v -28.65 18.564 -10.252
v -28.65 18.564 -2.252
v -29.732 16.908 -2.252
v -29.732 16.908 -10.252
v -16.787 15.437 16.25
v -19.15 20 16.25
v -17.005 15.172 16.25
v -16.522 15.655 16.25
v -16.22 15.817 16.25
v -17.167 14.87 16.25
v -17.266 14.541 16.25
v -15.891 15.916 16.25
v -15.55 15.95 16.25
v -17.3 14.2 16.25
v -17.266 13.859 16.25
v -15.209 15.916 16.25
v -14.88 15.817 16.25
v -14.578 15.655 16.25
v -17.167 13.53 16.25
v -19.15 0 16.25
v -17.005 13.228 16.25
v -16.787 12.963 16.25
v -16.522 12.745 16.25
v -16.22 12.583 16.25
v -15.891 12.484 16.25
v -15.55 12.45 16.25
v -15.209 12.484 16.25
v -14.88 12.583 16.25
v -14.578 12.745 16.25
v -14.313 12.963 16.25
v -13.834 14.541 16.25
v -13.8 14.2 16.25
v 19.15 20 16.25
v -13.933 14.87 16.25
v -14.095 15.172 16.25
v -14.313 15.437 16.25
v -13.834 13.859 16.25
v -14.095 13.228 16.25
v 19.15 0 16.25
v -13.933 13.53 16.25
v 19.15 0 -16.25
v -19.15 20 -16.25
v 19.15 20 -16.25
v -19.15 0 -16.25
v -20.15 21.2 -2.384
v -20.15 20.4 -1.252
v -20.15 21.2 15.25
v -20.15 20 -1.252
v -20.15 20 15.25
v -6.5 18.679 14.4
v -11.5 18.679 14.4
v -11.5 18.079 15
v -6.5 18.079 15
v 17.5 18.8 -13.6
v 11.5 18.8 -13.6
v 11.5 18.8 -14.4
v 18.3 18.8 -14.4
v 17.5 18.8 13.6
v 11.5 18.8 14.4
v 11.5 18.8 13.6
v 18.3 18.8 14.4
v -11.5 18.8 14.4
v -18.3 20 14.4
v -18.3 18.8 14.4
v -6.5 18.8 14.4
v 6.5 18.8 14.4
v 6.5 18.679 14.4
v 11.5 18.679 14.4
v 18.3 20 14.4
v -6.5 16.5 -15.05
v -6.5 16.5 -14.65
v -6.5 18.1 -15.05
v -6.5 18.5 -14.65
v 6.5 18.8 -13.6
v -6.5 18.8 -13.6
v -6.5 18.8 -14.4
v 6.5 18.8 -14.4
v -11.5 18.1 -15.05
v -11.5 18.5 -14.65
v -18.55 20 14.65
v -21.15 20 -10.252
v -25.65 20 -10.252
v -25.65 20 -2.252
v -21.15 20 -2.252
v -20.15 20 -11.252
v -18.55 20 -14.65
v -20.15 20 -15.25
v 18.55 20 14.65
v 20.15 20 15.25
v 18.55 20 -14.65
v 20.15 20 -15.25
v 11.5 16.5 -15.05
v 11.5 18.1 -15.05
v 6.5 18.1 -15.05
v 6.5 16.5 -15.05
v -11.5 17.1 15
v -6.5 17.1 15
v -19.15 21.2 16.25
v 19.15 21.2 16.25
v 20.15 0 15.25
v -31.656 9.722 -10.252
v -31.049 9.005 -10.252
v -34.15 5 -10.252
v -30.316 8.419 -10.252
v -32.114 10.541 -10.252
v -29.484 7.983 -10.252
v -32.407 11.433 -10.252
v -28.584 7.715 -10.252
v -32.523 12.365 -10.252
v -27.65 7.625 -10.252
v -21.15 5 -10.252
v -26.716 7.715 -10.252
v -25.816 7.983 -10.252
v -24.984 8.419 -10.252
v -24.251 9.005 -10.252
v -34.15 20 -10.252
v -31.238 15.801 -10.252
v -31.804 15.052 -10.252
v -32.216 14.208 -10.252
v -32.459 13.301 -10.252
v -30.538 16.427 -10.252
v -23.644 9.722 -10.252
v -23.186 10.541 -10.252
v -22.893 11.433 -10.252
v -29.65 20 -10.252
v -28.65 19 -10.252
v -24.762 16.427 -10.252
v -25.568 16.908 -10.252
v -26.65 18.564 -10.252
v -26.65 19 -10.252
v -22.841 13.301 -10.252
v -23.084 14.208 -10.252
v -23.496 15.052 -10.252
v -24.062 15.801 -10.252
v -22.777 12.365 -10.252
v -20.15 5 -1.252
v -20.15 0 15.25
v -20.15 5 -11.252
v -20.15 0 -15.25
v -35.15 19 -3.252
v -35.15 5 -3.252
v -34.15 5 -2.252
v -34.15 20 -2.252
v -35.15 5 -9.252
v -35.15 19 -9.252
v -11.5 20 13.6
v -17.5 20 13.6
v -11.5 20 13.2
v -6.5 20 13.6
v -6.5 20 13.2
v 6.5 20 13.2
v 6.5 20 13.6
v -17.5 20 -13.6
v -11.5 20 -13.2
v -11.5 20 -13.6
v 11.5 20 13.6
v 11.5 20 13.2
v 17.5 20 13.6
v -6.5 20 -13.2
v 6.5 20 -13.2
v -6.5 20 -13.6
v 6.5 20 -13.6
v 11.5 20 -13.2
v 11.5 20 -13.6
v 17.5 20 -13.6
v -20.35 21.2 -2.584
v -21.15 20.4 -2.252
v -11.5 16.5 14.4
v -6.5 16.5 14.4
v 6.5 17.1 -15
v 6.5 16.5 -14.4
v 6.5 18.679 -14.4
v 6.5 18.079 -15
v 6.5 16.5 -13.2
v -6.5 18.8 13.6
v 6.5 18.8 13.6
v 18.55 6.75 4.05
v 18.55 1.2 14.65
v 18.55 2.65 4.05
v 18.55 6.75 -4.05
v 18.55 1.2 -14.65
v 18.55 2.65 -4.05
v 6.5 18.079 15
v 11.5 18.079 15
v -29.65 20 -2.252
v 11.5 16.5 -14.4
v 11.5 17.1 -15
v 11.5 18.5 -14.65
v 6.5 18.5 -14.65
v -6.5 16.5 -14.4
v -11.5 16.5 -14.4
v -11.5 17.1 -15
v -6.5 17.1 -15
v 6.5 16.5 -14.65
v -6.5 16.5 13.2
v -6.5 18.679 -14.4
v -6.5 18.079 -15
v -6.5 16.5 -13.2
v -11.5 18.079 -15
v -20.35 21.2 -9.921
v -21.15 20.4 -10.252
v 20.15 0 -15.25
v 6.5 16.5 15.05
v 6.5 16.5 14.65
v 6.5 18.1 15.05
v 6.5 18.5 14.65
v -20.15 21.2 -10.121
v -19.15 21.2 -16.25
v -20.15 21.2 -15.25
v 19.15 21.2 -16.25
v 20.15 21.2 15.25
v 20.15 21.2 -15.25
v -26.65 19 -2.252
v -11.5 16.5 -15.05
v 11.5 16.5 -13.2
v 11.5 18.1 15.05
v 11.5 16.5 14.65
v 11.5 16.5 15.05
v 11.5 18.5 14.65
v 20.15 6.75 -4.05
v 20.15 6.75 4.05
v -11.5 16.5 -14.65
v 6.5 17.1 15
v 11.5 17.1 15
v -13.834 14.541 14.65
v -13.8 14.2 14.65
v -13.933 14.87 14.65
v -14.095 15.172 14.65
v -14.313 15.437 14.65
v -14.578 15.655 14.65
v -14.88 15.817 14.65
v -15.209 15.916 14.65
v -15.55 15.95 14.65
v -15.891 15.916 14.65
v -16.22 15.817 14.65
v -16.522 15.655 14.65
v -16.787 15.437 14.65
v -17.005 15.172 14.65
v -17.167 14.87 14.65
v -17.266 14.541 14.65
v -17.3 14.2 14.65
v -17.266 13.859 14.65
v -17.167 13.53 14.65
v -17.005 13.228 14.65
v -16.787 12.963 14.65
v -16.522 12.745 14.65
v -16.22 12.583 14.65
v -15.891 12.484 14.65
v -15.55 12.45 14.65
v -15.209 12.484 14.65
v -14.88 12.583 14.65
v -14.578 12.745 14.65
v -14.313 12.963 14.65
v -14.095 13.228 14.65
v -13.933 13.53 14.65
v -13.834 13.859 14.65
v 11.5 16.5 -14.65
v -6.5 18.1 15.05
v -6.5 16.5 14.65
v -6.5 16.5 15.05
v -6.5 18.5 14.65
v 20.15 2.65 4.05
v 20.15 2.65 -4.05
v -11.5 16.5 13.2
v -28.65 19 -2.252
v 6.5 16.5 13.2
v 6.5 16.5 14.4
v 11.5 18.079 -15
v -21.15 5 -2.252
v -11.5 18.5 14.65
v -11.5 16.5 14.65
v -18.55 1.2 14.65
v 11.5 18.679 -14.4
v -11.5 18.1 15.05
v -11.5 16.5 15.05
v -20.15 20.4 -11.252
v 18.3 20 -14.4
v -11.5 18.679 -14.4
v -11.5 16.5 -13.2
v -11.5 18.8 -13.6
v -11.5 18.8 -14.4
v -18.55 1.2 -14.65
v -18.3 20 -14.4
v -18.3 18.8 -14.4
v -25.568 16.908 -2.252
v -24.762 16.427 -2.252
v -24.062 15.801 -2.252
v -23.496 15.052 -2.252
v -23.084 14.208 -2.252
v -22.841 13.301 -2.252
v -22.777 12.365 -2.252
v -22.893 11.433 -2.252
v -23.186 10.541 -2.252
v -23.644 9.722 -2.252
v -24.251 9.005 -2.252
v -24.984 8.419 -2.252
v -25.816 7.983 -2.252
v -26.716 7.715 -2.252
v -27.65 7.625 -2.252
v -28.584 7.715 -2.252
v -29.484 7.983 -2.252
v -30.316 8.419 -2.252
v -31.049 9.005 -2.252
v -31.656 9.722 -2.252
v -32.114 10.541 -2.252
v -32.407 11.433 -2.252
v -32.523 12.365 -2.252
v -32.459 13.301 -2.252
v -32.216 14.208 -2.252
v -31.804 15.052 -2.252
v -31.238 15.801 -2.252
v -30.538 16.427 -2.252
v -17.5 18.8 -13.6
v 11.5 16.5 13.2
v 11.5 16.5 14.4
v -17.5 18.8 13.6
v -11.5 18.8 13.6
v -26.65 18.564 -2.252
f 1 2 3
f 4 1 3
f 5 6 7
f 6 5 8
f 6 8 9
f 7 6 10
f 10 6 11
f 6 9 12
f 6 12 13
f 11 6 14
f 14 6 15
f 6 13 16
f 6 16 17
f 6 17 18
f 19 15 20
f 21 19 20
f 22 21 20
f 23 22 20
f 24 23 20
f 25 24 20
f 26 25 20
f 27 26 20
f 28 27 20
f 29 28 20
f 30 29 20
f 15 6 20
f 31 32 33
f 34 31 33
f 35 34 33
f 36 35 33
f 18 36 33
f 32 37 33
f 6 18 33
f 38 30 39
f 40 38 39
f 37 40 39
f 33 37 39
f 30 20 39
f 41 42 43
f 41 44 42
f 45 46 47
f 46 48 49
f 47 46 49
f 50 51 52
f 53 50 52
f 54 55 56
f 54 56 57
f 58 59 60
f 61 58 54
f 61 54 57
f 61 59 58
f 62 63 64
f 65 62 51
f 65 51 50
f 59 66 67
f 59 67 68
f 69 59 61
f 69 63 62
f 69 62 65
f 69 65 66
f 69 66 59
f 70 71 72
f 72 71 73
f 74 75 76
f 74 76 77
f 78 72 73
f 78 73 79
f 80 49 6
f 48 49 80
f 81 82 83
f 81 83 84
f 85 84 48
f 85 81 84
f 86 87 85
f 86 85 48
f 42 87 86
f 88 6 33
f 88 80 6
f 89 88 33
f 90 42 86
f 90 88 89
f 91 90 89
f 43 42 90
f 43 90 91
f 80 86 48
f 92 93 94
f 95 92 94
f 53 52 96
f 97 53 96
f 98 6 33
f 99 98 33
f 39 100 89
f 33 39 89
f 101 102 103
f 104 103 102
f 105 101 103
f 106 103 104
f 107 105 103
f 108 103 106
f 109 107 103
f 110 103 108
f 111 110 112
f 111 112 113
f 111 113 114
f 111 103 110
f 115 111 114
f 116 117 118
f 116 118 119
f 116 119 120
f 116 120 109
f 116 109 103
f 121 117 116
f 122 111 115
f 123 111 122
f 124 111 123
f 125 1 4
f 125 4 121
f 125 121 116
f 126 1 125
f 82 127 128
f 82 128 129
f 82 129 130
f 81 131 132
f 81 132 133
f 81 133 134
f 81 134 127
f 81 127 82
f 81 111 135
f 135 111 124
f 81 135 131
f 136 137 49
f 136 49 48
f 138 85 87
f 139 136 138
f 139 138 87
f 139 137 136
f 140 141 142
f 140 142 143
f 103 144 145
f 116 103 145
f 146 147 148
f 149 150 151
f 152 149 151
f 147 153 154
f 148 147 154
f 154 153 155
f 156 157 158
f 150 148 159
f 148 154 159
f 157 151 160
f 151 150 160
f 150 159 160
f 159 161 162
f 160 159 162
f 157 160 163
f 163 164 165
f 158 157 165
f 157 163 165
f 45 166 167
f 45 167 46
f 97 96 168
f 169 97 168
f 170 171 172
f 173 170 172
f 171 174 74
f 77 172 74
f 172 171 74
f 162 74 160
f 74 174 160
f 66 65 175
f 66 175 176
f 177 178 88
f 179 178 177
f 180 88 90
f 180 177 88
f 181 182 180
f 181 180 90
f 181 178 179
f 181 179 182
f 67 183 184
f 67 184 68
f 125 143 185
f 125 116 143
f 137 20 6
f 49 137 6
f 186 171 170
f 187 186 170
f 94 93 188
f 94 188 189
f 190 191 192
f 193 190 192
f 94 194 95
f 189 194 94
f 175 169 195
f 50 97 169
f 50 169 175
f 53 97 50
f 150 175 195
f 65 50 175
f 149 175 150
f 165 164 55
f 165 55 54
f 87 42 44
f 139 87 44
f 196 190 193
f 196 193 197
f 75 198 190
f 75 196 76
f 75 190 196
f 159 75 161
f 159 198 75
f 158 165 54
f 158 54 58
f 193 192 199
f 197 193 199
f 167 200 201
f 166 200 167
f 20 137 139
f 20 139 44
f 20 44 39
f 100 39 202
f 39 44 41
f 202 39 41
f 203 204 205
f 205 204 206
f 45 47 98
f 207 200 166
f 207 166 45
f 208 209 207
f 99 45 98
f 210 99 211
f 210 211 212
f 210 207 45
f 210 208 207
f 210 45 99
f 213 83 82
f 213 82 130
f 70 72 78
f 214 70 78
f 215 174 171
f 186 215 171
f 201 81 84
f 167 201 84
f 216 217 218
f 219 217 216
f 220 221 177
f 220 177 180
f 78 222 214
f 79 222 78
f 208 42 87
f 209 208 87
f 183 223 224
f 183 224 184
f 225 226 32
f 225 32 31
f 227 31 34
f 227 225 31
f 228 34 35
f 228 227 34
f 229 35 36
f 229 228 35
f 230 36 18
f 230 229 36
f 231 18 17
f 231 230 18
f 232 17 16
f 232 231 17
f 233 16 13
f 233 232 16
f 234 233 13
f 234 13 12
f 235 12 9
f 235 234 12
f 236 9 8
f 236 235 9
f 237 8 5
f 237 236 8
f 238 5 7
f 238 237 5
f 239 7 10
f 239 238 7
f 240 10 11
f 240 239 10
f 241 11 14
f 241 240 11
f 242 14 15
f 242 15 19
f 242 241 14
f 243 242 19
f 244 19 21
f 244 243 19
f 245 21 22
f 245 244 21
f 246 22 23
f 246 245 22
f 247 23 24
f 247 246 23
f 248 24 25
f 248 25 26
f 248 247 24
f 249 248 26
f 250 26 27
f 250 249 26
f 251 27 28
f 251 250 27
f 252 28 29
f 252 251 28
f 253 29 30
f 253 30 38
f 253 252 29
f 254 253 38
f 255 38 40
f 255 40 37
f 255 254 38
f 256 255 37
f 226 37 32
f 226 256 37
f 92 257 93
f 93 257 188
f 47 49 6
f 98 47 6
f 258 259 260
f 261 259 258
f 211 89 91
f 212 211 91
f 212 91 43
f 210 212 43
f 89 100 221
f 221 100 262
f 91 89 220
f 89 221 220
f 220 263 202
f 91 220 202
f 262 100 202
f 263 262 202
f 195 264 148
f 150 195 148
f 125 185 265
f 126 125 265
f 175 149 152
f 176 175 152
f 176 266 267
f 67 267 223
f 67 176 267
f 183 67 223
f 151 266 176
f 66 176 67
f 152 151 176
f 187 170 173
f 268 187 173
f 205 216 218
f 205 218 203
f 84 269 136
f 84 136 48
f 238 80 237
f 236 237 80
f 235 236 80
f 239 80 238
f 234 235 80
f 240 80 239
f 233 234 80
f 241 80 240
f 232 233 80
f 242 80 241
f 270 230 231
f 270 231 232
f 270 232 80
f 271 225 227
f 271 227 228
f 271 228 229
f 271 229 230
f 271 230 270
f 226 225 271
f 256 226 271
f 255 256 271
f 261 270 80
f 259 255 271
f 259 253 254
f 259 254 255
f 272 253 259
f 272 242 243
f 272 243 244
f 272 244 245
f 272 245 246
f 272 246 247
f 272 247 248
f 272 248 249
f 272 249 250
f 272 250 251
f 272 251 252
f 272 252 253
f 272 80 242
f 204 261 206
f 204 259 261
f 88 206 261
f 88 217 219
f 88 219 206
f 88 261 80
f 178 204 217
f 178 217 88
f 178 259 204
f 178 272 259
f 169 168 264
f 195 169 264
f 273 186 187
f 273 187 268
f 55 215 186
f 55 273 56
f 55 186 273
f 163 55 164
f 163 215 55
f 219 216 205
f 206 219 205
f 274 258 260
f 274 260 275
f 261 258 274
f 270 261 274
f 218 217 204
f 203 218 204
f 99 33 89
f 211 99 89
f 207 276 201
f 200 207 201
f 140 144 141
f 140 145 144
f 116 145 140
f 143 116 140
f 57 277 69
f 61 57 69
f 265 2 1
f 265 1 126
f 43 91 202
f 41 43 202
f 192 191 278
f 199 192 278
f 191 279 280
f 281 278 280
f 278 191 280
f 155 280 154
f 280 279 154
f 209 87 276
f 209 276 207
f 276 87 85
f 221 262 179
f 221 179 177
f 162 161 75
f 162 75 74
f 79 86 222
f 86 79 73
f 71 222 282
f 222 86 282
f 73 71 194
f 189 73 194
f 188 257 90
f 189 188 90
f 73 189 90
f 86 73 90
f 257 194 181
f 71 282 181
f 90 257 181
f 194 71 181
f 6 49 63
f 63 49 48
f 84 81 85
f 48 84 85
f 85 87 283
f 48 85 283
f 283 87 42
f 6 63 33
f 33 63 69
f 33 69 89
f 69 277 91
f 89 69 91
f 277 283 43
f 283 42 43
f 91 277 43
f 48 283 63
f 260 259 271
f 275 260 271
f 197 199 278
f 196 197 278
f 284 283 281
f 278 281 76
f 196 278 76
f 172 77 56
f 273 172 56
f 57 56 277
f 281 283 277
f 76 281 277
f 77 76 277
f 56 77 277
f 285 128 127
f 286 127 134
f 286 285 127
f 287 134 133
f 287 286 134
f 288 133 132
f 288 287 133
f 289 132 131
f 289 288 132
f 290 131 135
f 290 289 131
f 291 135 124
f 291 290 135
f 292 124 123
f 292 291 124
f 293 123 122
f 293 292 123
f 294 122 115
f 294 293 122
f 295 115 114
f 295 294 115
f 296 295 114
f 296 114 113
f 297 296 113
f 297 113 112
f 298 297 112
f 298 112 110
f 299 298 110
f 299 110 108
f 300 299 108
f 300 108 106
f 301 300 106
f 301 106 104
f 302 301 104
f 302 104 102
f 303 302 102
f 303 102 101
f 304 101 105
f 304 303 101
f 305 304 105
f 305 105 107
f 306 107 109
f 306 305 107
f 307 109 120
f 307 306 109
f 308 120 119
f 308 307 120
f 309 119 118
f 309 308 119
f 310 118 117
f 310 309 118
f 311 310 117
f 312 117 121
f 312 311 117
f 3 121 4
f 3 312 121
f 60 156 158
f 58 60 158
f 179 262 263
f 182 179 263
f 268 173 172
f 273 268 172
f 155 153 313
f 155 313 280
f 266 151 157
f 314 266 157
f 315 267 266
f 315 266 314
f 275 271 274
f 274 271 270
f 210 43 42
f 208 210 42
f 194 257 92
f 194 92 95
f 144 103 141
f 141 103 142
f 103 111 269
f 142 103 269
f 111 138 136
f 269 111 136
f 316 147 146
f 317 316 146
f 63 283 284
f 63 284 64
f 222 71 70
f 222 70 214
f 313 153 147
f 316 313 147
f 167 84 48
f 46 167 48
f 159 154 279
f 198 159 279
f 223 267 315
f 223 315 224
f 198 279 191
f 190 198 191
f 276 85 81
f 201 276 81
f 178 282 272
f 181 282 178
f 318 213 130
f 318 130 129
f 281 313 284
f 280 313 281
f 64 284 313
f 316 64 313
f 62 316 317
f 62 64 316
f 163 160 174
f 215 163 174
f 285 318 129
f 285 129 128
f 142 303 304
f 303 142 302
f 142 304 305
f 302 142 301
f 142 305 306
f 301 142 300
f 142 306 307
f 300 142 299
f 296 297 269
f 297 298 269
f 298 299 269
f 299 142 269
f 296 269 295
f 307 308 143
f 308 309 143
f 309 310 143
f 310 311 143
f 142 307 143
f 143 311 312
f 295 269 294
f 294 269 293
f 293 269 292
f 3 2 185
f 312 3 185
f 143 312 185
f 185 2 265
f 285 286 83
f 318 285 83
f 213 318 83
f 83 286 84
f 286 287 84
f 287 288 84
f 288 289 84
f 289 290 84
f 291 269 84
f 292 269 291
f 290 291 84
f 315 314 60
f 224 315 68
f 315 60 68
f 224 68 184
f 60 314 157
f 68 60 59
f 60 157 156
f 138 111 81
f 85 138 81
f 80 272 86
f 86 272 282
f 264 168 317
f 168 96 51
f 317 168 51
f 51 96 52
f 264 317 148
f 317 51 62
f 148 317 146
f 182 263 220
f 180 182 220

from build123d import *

# Parameters (mm, degrees)
SKETCH2_W                = 40.3
SKETCH2_H                = 32.5
BOSS_EXTRUDE1_DEPTH      = 1.2
SKETCH2_3_W              = 40.3
SKETCH2_3_H              = 32.5
SKETCH2_3_W_2            = 37.1
SKETCH2_3_H_2            = 29.3
BOSS_EXTRUDE2_DEPTH      = 20
CUT_EXTRUDE1_REACH       = 49.835
SKETCH3_W                = 8.1
SKETCH3_H                = 4.1
CHAMFER1_SIZE            = 1
SKETCH4_W                = 8
SKETCH4_H                = 15
BOSS_EXTRUDE3_DEPTH      = 15
CUT_EXTRUDE3_REACH       = 46.473
CHAMFER2_SIZE            = 1.292646163
CHAMFER2_SIZE_2          = 1
CHAMFER3_SIZE            = 1
SKETCH6_W                = 5
SKETCH6_H                = 2
CUT_EXTRUDE4_DEPTH       = 0.4
CHAMFER4_SIZE            = 0.4
CHAMFER4_OF_MIRROR1_SIZE = 0.4
SKETCH7_W                = 37.1
SKETCH7_H                = 29.3
BOSS_EXTRUDE4_DEPTH      = 1.2
CHAMFER5_SIZE            = 0.8
SKETCH8_W                = 36.6
SKETCH8_H                = 28.8
SKETCH8_W_2              = 35
SKETCH8_H_2              = 27.2
BOSS_EXTRUDE5_DEPTH      = 1.2
SKETCH10_W               = 5
SKETCH10_H               = 1.2
BOSS_EXTRUDE6_DEPTH      = 3.5
BOSS_EXTRUDE7_DEPTH      = 5
CUT_EXTRUDE6_START       = -11.5
CUT_EXTRUDE6_DEPTH       = 5
CUT_EXTRUDE6_START_2     = 6.5
CUT_EXTRUDE6_2_DEPTH     = 5
CUT_EXTRUDE6_START_3     = 14.65
CUT_EXTRUDE6_3_OUTLINE_R = 1.75
CUT_EXTRUDE6_3_DEPTH     = 1.6


with BuildPart() as part:
    # Sketch2 → Boss-Extrude1 (new body)
    with BuildSketch(Plane(origin=(0, 0, 0), x_dir=(1, 0, 0), z_dir=(0, 1, 0))):
        Rectangle(SKETCH2_W, SKETCH2_H)
    extrude(amount=BOSS_EXTRUDE1_DEPTH)

    # Sketch2<3> → Boss-Extrude2 (add)
    with BuildSketch(Plane(origin=(0, 0, 0), x_dir=(1, 0, 0), z_dir=(0, 1, 0))):
        Rectangle(SKETCH2_3_W, SKETCH2_3_H)
        Rectangle(SKETCH2_3_W_2, SKETCH2_3_H_2, mode=Mode.SUBTRACT)
    extrude(amount=BOSS_EXTRUDE2_DEPTH)

    # Sketch3 → Cut-Extrude1 (cut, up to next)
    with BuildSketch(Plane(origin=(20.15, 0, 0), x_dir=(0, 0, -1), z_dir=(1, 0, 0)), mode=Mode.PRIVATE) as cut_extrude1_sk1:
        with Locations((0, 4.7)):
            Rectangle(SKETCH3_W, SKETCH3_H)
    cut_extrude1_tool1 = extrude(cut_extrude1_sk1.sketch, amount=-CUT_EXTRUDE1_REACH, mode=Mode.PRIVATE) & part.part
    add(cut_extrude1_tool1.solids().sort_by_distance((20.15, 4.7, 0))[0], mode=Mode.SUBTRACT)

    # Chamfer1
    chamfer1_edges = [part.edges().sort_by_distance(p)[0] for p in [
        (-20.15, 10, -16.25),
        (20.15, 10, -16.25),
        (20.15, 10, 16.25),
        (-20.15, 10, 16.25),
    ]]
    chamfer(chamfer1_edges, length=CHAMFER1_SIZE)

    # Sketch4 → Boss-Extrude3 (add)
    with BuildSketch(Plane.ZY.offset(20.15)):
        with Locations((-6.25220384, 12.5)):
            Rectangle(SKETCH4_W, SKETCH4_H)
    extrude(amount=BOSS_EXTRUDE3_DEPTH)

    # Sketch5 → Cut-Extrude3 (cut, up to next)
    with BuildSketch(Plane.XY.offset(-2.25220384), mode=Mode.PRIVATE) as cut_extrude3_sk1:
        with BuildLine():
            Line((-28.65, 17.271333671), (-28.65, 20))
            Line((-28.65, 20), (-26.65, 20))
            Line((-26.65, 20), (-26.65, 17.271333671))
            ThreePointArc((-26.65, 17.271333671), (-27.65, 7.625), (-28.65, 17.271333671))
        make_face()
    cut_extrude3_tool1 = extrude(cut_extrude3_sk1.sketch, amount=-CUT_EXTRUDE3_REACH, mode=Mode.PRIVATE) & part.part
    add(cut_extrude3_tool1.solids().sort_by_distance((-27.65, 12.91032, -2.252204))[0], mode=Mode.SUBTRACT)

    # Chamfer2
    # the kernel refuses this chamfer: 1.292646163, 1 mm, written as the material it takes off along each edge
    with BuildSketch(Plane(origin=(-28.65, 17.271333671, 1.088369735), x_dir=(0, 1, 0), z_dir=(0, 0, -1))) as chamfer2_piece_1:
        with BuildLine():
            Line((CHAMFER2_SIZE, 0), (-0.363341225, -1.082120936))
            ThreePointArc((-0.363341225, -1.082120936), (-0.156455935, -0.571155143), (0, 0))
            Line((0, 0), (CHAMFER2_SIZE, 0))
        make_face()
    extrude(amount=14.68114715, mode=Mode.SUBTRACT)
    with BuildSketch(Plane(origin=(-28.65, 20, 0.319479148), x_dir=(-1, 0, 0), z_dir=(0, 0, -1))) as chamfer2_piece_2:
        Polygon((CHAMFER2_SIZE_2, 0), (0, -CHAMFER2_SIZE_2), (0, 0), align=None)
    extrude(amount=13.143365976, mode=Mode.SUBTRACT)
    with BuildSketch(Plane(origin=(-26.65, 20, 0.319479148), x_dir=(1, 0, 0), z_dir=(0, 0, -1))) as chamfer2_piece_3:
        Polygon((CHAMFER2_SIZE_2, 0), (0, CHAMFER2_SIZE_2), (0, 0), align=None)
    extrude(amount=13.143365976, mode=Mode.SUBTRACT)
    with BuildSketch(Plane(origin=(-26.65, 17.271333671, 1.088369735), x_dir=(0, 1, 0), z_dir=(0, 0, -1))) as chamfer2_piece_4:
        with BuildLine():
            Line((CHAMFER2_SIZE, 0), (-0.363341225, 1.082120936))
            ThreePointArc((-0.363341225, 1.082120936), (-0.156455935, 0.571155143), (0, 0))
            Line((0, 0), (CHAMFER2_SIZE, 0))
        make_face()
    extrude(amount=14.68114715, mode=Mode.SUBTRACT)

    # Chamfer3
    chamfer3_edges = [part.edges().sort_by_distance(p)[0] for p in [
        (-20.15, 12.5, -10.25220384),
        (-20.15, 12.5, -2.25220384),
        (-35.15, 12.5, -10.25220384),
        (-35.15, 12.5, -2.25220384),
        (-35.15, 20, -6.25220384),
    ]]
    chamfer(chamfer3_edges, length=CHAMFER3_SIZE)

    # Sketch6 → Cut-Extrude4 (cut)
    with BuildSketch(Plane(origin=(0, 0, 14.65), x_dir=(-1, 0, 0), z_dir=(0, 0, -1))):
        with Locations((-9, 17.5)):
            Rectangle(SKETCH6_W, SKETCH6_H)
        with Locations((9, 17.5)):
            Rectangle(SKETCH6_W, SKETCH6_H)
    cut_extrude4 = extrude(amount=-CUT_EXTRUDE4_DEPTH, mode=Mode.SUBTRACT)

    # Chamfer4
    chamfer4_edges = [part.edges().sort_by_distance(p)[0] for p in [
        (9, 18.5, 15.05),
        (-9, 18.5, 15.05),
    ]]
    chamfer(chamfer4_edges, length=CHAMFER4_SIZE - 0.0001)  # a hair under: the kernel refuses the full size

    # Mirror1: Cut-Extrude4 across plane
    add(cut_extrude4.mirror(Plane.XY), mode=Mode.SUBTRACT)

    # Chamfer4 of Mirror1
    chamfer4_of_mirror1_edges = [part.edges().sort_by_distance(p)[0] for p in [
        (9, 18.5, -15.05),
        (-9, 18.5, -15.05),
    ]]
    chamfer(chamfer4_of_mirror1_edges, length=CHAMFER4_OF_MIRROR1_SIZE - 0.0001)  # a hair under: the kernel refuses the full size

    # Cut-Extrude6 3 outline → Cut-Extrude6 3 (cut)
    with BuildSketch(Plane.XY.offset(CUT_EXTRUDE6_START_3)):
        with Locations((-15.55, 14.2)):
            Circle(CUT_EXTRUDE6_3_OUTLINE_R)
    extrude(amount=CUT_EXTRUDE6_3_DEPTH, mode=Mode.SUBTRACT)


with BuildPart() as body_2:
    # Sketch7 → Boss-Extrude4 (new body)
    # profile 1 of 2: a face of its own
    with BuildSketch(Plane(origin=(0, 20, 0), x_dir=(1, 0, 0), z_dir=(0, 1, 0))):
        Polygon((-21.15, 10.25220384), (-21.15, 2.25220384), (-20.15, 1.25220384), (-20.15, -15.25), (-19.15, -16.25), (19.15, -16.25), (20.15, -15.25), (20.15, 15.25), (19.15, 16.25), (-19.15, 16.25), (-20.15, 15.25), (-20.15, 11.25220384), align=None)
        Rectangle(SKETCH7_W, SKETCH7_H, mode=Mode.SUBTRACT)
    # profile 2 of 2: a face of its own
    with BuildSketch(Plane(origin=(0, 20, 0), x_dir=(1, 0, 0), z_dir=(0, 1, 0))):
        Rectangle(SKETCH7_W, SKETCH7_H)
    extrude(amount=BOSS_EXTRUDE4_DEPTH)

    # Chamfer5
    chamfer5_edges = [body_2.edges().sort_by_distance(p)[0] for p in [
        (-21.15, 21.2, -6.25220384),
        (-20.65, 21.2, -1.75220384),
        (-20.65, 21.2, -10.75220384),
    ]]
    chamfer(chamfer5_edges, length=CHAMFER5_SIZE)

    # Sketch8 → Boss-Extrude5 (add)
    with BuildSketch(Plane.XZ.offset(-20)):
        Rectangle(SKETCH8_W, SKETCH8_H)
        Rectangle(SKETCH8_W_2, SKETCH8_H_2, mode=Mode.SUBTRACT)
    extrude(amount=BOSS_EXTRUDE5_DEPTH)

    # Sketch10 → Boss-Extrude6 (add)
    with BuildSketch(Plane.XZ.offset(-20)):
        with Locations((9, 13.8)):
            Rectangle(SKETCH10_W, SKETCH10_H)
    extrude(amount=BOSS_EXTRUDE6_DEPTH)

    # Sketch13 → Boss-Extrude7 (add)
    with BuildSketch(Plane.ZY.offset(-6.5)):
        Polygon((15, 18.079289322), (14.4, 18.679289322), (14.4, 16.5), (15, 17.1), align=None)
    extrude(amount=-BOSS_EXTRUDE7_DEPTH)

    # Cut-Extrude6: read off the stored shape, not the designer's step
    # Cut-Extrude6 outline → Cut-Extrude6 (add)
    with BuildSketch(Plane.YZ.offset(CUT_EXTRUDE6_START)):
        Polygon((20, 13.2), (20, 13.6), (18.8, 13.6), (18.8, 14.4), (18.679289322, 14.4), (18.079289322, 15), (17.1, 15), (16.5, 14.4), (16.5, 13.2), align=None)
        Polygon((20, -13.6), (20, -13.2), (16.5, -13.2), (16.5, -14.4), (17.1, -15), (18.079289322, -15), (18.679289322, -14.4), (18.8, -14.4), (18.8, -13.6), align=None)
    extrude(amount=CUT_EXTRUDE6_DEPTH)

    # Cut-Extrude6 2 outline → Cut-Extrude6 2 (add)
    with BuildSketch(Plane.YZ.offset(CUT_EXTRUDE6_START_2)):
        Polygon((20, -13.6), (20, -13.2), (16.5, -13.2), (16.5, -14.4), (17.1, -15), (18.079289322, -15), (18.679289322, -14.4), (18.8, -14.4), (18.8, -13.6), align=None)
    extrude(amount=CUT_EXTRUDE6_2_DEPTH)


solid = Compound([part.part, body_2.part])
